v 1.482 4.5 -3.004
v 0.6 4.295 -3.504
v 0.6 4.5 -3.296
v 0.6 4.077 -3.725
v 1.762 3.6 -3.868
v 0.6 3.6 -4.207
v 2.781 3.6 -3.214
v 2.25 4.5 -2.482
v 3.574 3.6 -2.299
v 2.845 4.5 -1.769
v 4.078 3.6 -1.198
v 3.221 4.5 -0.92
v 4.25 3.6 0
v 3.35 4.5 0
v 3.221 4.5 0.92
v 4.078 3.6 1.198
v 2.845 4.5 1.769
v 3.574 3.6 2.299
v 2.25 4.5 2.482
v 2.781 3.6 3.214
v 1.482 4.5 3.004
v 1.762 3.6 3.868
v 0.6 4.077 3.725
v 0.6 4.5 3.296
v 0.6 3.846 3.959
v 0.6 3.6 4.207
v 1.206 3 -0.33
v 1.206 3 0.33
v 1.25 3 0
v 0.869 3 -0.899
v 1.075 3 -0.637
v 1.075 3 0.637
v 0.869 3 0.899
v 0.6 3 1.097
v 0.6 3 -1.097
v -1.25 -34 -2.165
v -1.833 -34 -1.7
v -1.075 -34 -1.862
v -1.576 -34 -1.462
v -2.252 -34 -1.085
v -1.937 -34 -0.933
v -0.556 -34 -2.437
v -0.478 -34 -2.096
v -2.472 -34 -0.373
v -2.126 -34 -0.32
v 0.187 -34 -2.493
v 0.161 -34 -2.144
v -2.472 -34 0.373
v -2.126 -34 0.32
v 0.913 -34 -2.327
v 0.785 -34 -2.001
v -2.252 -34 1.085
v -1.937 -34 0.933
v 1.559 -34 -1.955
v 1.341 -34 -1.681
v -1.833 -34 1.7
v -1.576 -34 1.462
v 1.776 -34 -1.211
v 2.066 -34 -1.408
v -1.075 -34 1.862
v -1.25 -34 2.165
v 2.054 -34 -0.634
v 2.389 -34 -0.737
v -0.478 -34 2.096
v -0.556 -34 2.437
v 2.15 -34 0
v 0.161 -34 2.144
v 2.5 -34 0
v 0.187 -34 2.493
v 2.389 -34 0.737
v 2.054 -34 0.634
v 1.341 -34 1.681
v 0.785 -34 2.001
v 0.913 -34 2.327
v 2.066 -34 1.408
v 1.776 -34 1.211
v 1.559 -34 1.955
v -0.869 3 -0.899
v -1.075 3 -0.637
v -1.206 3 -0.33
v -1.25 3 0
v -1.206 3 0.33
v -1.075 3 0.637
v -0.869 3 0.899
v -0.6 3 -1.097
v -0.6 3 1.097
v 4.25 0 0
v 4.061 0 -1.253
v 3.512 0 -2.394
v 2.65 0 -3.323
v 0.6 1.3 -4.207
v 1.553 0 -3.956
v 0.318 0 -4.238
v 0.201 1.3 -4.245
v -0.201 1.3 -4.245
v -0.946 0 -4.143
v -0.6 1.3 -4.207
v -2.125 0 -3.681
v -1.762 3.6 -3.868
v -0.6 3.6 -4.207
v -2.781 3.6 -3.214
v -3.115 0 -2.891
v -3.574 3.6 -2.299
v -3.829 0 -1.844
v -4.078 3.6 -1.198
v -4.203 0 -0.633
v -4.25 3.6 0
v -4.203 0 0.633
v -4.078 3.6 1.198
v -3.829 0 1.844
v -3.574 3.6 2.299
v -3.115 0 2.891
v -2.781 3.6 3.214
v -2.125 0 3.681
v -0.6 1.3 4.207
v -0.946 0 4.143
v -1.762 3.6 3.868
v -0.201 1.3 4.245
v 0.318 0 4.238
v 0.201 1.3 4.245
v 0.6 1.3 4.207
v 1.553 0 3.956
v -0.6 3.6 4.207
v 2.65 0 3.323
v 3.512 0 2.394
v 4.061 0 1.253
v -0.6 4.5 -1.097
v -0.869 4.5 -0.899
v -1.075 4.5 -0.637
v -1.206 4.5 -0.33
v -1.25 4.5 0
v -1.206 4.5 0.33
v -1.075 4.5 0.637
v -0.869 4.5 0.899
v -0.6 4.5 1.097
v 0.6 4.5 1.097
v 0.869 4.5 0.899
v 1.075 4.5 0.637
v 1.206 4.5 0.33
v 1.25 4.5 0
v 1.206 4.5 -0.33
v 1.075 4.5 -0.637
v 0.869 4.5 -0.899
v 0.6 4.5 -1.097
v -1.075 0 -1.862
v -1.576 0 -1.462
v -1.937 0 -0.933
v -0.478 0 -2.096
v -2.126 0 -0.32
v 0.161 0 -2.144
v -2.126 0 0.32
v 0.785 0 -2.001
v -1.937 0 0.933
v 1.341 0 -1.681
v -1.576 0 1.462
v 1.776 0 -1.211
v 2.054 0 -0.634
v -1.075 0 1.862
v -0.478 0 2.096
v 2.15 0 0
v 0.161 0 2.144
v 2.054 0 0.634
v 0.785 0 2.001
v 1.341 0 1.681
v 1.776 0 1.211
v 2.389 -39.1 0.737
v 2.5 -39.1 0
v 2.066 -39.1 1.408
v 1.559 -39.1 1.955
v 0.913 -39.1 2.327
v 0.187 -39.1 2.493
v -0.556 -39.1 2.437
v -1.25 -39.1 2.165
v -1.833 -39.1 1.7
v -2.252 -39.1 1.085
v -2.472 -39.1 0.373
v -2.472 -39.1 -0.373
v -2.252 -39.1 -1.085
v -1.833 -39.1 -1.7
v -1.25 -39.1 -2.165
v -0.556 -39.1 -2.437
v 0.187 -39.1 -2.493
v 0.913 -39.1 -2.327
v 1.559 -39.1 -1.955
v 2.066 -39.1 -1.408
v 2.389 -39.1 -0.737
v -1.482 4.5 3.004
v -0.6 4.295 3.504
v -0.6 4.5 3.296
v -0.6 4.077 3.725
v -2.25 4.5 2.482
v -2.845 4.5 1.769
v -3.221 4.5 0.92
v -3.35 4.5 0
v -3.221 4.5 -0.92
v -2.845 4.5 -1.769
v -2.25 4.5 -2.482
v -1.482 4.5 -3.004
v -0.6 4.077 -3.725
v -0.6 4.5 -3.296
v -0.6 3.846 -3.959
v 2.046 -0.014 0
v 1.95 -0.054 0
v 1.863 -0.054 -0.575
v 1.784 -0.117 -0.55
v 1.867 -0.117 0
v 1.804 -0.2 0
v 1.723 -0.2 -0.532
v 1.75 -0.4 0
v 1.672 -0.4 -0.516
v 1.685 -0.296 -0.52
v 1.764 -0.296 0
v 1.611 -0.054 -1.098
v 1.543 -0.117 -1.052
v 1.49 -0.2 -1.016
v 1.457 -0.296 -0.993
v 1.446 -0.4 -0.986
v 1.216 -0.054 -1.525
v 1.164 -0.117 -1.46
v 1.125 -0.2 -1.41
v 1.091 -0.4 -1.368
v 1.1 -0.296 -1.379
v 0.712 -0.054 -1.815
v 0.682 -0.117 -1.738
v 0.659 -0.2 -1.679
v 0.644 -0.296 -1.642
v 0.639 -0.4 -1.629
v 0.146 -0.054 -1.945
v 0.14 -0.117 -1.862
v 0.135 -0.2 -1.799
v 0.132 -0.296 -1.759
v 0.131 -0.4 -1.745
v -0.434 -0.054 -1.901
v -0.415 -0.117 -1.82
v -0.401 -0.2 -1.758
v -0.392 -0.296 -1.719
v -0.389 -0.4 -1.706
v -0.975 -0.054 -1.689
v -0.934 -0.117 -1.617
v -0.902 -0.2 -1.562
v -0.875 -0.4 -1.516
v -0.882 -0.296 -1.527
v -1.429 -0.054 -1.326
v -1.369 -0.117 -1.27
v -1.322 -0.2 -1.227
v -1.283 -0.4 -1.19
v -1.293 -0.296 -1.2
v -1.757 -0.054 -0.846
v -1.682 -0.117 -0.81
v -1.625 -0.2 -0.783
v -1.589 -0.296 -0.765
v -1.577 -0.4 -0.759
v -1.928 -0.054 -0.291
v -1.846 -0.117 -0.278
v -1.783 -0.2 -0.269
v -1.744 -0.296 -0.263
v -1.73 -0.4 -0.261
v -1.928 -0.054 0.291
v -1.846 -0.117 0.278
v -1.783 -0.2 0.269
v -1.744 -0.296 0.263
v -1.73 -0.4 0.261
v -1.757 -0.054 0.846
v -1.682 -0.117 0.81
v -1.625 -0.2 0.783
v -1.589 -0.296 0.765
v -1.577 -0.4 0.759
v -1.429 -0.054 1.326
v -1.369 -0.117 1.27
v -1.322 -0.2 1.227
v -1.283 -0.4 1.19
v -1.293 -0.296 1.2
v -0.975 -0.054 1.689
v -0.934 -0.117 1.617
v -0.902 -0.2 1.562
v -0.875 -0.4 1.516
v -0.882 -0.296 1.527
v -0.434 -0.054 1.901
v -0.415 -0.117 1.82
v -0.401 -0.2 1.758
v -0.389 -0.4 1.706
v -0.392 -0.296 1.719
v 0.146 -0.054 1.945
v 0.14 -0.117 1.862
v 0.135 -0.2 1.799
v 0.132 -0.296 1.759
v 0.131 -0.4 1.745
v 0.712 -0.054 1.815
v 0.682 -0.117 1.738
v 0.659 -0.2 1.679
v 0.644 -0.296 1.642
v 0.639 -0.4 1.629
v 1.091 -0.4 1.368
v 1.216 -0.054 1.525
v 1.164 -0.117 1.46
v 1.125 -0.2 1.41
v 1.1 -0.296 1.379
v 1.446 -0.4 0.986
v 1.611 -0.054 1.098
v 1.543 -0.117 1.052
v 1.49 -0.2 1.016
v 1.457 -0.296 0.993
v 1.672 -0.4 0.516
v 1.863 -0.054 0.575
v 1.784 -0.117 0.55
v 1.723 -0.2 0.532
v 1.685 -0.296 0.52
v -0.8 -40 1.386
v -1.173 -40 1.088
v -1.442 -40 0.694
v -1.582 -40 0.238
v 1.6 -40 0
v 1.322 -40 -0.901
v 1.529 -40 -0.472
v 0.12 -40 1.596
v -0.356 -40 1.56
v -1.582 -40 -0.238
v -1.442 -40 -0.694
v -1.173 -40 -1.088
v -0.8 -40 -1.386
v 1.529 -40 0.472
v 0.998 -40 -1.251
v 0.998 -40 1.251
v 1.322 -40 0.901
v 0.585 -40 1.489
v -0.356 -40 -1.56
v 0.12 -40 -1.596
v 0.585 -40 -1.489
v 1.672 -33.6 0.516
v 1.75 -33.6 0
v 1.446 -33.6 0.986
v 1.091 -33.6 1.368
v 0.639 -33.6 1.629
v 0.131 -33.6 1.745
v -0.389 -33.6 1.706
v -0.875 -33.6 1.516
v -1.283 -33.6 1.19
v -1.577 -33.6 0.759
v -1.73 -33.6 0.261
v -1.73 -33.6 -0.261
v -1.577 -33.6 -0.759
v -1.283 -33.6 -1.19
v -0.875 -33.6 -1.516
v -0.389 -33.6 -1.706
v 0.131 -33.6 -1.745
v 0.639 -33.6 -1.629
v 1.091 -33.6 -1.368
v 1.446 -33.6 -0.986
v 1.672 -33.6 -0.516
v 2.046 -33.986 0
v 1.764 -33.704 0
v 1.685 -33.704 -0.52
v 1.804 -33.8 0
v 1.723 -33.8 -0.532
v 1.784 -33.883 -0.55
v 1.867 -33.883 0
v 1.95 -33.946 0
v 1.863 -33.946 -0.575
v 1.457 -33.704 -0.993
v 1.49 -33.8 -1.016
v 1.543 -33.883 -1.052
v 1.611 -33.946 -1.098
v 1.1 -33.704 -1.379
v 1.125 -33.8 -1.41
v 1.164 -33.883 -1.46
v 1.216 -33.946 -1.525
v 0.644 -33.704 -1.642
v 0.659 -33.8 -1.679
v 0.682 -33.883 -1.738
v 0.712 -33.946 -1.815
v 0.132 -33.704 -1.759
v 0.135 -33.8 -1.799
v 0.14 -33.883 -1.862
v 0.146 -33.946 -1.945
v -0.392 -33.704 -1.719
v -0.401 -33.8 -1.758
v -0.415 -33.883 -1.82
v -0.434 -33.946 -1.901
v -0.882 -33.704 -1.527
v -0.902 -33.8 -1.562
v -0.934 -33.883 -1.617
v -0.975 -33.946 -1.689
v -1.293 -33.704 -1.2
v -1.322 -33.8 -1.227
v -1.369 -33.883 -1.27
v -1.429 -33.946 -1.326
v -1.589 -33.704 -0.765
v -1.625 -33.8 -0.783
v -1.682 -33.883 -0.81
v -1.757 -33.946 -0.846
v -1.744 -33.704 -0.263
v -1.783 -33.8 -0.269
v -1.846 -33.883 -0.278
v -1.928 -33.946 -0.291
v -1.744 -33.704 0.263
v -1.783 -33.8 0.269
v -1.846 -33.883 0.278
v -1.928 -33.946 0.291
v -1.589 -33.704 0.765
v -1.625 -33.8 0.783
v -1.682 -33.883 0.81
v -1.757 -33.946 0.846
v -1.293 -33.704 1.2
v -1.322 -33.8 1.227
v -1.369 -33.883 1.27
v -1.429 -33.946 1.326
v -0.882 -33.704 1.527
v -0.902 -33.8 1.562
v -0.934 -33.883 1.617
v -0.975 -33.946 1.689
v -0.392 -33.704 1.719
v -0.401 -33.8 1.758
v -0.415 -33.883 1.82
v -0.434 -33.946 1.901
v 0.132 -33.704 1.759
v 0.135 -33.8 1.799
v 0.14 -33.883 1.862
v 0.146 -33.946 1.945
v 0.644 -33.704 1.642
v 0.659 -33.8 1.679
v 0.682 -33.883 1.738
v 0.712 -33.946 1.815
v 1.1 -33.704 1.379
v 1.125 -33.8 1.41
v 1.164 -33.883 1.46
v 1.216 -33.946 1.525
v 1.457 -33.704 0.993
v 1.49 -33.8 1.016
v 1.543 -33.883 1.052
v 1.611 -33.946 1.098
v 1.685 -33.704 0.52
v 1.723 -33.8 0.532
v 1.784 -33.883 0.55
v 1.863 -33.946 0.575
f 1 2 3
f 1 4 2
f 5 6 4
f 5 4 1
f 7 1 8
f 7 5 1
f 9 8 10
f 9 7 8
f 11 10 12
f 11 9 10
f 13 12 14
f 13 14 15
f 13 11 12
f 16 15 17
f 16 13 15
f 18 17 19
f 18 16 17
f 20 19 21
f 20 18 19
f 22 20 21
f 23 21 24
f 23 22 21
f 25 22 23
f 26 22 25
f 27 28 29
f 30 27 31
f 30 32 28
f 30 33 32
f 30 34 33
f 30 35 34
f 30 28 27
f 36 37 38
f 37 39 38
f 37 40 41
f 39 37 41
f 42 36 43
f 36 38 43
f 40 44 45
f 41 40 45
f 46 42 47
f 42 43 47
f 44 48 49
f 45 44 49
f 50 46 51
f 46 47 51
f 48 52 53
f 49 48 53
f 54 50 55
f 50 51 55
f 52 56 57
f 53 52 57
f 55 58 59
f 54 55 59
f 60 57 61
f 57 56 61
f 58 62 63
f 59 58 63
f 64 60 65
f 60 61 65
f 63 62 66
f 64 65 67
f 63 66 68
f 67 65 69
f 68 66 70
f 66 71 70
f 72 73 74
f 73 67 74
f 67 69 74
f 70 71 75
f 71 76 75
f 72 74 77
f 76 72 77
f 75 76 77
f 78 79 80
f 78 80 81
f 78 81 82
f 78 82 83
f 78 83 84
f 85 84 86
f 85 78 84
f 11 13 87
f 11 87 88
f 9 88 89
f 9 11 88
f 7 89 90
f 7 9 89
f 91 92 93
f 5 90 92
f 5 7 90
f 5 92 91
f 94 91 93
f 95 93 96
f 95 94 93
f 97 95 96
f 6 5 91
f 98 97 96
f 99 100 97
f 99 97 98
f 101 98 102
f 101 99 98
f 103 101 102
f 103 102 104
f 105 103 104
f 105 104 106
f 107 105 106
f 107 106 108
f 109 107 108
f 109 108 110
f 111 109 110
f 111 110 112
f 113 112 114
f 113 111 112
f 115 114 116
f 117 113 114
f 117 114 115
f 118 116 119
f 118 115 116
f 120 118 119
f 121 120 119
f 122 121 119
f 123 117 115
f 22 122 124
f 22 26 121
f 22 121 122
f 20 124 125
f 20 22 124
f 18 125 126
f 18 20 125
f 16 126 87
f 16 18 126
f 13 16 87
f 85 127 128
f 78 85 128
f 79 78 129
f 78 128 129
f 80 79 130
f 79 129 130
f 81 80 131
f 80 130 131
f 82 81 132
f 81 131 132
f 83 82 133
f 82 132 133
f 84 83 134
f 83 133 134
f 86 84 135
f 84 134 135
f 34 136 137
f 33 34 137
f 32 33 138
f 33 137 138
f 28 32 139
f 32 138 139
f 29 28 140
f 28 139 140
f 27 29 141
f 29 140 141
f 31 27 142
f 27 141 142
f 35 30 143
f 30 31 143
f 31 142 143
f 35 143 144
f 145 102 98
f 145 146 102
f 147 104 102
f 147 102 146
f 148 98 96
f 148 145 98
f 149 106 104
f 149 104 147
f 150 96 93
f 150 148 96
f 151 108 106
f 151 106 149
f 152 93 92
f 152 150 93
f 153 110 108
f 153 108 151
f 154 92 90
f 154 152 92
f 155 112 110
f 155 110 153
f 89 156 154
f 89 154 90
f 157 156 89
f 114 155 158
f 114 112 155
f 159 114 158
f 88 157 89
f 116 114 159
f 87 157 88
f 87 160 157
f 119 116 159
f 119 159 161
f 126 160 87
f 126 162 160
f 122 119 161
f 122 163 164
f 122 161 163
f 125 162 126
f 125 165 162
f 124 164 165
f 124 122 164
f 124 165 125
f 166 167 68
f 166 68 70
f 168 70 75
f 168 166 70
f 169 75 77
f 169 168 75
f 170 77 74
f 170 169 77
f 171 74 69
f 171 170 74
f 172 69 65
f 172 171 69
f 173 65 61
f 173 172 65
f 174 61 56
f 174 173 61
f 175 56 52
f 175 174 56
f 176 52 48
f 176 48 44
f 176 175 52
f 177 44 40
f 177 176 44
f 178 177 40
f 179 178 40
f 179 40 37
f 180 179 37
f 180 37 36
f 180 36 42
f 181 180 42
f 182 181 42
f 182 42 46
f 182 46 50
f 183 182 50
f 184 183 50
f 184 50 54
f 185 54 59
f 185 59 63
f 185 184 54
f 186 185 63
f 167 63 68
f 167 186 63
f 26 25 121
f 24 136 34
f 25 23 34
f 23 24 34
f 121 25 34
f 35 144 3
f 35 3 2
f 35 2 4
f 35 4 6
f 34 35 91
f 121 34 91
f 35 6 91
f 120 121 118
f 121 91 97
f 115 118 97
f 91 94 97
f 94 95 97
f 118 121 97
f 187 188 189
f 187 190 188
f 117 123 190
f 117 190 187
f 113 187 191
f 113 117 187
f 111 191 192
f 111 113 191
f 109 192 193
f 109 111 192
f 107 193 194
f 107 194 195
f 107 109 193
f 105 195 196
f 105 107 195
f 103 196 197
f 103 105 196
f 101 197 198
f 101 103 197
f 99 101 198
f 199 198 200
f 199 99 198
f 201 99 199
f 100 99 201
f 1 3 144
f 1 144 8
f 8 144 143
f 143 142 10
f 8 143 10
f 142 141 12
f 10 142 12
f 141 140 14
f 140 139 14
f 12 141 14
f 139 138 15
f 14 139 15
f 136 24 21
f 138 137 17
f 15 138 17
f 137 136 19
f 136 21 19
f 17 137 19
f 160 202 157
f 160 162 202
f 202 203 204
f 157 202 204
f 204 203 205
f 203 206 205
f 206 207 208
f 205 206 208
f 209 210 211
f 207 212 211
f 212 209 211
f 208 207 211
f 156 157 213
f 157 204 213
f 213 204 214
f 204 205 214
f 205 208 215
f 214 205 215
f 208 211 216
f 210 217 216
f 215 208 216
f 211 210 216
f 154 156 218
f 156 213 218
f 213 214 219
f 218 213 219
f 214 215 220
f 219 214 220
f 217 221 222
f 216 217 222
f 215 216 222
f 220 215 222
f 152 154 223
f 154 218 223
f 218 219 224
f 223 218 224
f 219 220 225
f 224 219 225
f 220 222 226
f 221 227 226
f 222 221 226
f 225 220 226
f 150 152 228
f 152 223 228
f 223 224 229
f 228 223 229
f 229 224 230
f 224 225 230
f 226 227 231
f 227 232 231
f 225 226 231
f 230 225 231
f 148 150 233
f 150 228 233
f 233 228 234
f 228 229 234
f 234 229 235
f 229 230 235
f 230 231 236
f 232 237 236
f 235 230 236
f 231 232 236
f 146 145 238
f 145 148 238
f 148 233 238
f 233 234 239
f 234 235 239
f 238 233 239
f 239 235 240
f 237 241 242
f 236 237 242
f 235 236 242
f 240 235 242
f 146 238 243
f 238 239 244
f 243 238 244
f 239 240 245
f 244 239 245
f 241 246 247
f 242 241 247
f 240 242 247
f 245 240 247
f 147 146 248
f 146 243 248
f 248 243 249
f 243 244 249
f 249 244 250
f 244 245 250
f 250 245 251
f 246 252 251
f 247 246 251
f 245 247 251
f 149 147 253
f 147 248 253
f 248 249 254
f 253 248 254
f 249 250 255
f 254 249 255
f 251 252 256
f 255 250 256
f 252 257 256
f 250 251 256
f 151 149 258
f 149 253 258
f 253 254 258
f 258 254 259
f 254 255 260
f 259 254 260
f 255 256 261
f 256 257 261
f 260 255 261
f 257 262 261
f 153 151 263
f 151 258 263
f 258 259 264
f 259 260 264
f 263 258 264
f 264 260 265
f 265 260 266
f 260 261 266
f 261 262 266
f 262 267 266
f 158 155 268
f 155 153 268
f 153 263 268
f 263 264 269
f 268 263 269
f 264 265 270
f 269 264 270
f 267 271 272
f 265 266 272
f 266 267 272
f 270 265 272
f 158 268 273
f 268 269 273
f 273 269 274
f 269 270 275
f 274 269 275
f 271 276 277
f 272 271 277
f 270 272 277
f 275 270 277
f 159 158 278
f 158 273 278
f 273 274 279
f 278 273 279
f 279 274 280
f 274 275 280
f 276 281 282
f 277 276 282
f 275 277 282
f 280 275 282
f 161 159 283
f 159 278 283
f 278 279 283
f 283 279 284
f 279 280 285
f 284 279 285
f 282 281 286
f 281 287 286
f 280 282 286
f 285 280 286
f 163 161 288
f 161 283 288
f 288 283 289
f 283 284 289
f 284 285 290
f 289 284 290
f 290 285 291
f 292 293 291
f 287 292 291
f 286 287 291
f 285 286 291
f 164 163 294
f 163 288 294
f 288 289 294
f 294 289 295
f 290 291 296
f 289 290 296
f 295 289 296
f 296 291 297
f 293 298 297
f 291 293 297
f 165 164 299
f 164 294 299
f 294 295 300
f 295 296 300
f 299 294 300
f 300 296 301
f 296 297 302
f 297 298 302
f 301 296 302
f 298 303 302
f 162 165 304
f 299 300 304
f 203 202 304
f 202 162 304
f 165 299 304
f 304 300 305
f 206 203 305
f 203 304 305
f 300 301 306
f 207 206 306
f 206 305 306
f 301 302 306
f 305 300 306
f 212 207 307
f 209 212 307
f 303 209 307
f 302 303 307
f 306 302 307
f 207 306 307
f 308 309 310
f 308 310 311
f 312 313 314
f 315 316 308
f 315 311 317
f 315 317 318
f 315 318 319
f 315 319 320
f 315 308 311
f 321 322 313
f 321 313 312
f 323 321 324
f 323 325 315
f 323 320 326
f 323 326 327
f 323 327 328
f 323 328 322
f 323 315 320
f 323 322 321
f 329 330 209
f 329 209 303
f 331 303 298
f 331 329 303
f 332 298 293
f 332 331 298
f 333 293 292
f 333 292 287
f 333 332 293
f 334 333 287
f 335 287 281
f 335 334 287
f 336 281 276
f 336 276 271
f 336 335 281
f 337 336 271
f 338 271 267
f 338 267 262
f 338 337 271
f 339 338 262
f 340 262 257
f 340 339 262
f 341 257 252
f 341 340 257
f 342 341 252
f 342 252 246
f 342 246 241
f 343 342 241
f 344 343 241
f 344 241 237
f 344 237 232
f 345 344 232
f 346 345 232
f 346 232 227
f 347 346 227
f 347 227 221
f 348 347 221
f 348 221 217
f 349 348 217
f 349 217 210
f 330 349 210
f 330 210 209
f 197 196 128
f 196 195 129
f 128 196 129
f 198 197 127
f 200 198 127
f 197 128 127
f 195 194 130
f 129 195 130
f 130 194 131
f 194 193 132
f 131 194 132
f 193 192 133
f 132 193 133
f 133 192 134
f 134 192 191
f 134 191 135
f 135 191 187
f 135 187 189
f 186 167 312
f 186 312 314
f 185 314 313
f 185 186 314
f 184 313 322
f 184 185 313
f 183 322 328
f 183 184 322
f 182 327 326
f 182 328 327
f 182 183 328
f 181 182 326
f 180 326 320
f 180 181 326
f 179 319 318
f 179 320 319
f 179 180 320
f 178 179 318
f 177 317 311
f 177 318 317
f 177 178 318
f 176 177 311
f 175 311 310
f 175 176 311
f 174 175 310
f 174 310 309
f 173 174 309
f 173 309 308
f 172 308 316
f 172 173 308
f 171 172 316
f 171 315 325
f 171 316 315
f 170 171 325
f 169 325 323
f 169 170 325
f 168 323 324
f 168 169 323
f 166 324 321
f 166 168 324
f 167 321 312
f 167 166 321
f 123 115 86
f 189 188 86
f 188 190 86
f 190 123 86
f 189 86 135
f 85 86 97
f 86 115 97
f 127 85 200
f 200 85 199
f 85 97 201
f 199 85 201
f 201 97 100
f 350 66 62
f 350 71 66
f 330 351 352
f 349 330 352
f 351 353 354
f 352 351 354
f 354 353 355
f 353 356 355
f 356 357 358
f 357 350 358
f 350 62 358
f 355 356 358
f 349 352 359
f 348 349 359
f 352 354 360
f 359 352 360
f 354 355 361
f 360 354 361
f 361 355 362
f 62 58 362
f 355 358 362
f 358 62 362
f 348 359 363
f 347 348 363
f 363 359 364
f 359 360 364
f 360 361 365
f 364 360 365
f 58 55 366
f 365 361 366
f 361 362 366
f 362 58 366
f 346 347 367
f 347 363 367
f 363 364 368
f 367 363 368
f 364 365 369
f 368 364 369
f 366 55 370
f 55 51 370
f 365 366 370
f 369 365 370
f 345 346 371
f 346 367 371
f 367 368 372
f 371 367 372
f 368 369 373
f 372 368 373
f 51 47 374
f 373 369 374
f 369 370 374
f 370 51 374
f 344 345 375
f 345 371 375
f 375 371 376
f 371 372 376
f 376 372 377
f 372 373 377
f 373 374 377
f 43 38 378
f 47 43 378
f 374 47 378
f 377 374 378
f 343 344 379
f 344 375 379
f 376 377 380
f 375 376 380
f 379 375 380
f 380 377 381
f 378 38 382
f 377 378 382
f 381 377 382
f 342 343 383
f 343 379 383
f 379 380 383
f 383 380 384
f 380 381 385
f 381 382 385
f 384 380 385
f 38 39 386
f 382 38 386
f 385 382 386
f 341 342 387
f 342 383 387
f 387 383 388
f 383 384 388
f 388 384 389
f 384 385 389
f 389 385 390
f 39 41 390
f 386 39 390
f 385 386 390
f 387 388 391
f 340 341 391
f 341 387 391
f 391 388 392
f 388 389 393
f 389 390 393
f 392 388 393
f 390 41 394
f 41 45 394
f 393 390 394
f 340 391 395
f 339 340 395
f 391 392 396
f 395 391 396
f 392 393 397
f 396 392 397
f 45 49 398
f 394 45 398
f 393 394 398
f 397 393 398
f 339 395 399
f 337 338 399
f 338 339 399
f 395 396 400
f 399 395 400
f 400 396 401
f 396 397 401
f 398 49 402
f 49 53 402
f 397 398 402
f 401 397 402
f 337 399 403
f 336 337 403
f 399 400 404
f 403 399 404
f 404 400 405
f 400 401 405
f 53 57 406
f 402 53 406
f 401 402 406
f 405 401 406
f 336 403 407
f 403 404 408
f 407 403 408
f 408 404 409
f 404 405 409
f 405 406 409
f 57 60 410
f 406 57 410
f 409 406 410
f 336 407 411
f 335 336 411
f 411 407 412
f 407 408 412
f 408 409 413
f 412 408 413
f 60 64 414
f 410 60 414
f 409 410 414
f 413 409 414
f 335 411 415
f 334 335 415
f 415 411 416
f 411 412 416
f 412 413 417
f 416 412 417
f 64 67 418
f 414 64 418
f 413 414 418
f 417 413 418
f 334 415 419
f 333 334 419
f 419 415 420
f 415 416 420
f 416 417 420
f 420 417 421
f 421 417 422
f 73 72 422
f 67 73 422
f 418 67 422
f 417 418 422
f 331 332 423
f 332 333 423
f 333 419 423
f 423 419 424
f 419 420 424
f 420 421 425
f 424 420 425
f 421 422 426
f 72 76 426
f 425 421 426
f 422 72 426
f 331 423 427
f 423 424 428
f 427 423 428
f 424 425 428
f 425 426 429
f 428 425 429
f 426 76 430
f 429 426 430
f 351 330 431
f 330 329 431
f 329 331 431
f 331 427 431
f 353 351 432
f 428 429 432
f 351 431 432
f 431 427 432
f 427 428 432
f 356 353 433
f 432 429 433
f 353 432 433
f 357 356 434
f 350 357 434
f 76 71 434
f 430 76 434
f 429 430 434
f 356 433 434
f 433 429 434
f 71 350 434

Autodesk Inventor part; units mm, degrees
ref_plane "YZ Plane" through (0, 0, 0) normal (1, 0, 0) x (0, 1, 0)
ref_plane "XZ Plane" through (0, 0, 0) normal (0, 1, 0) x (-1, 0, 0)
ref_plane "XY Plane" through (0, 0, 0) normal (0, 0, 1) x (1, 0, 0)
sketch "Sketch1" plane through (0, 0, 0) normal (0, 0, 1) x (1, 0, 0)
  line L0 (4.25, 0) -> (4.25, 4.5)
  line L1 (4.25, 4.5) -> (0, 4.5)
  line L2 (4.25, 0) -> (1.75, 0)
  line L3 (1.75, 0) -> (1.75, -34)
  line L4 (1.75, -34) -> (2.5, -34)
  line L5 (2.5, -34) -> (2.5, -40)
  line L6 (2.5, -40) -> (0, -40)
  line L7 (0, 4.5) -> (0, -40)
  point P0 (0, 0)
  dimension "d0" = 8.5
  dimension "d2" = 3.5
  dimension "d3" = 5
  dimension "d4" = 4.5
  dimension "d5" = 6
  dimension "d6" = 40
revolve "Вращение1" add sketch "Sketch1" angle 360 about axis through (0, 4.5, 0) along (0, -1, 0)
sketch "Sketch2" plane through (0, 4.5, 0) normal (0, 1, 0) x (1, 0, 0)
  circle A0 centre (0, 0) radius 4.25 construction
  circle A1 centre (0, 0) radius 1.25
  dimension "d31" = 2.5
extrude "Выдавливание1" cut sketch "Sketch2" against normal blind 1.5
chamfer "Фаска1" distance 0.9 angle 45 1 edges at (-4.25, 4.5, 0)
sketch "Sketch3" plane through (0, 0, 0) normal (0, 0, 1) x (1, 0, 0)
  line L0 (0, 0) -> (0, 4.5)
  line L1 (-2.3552, 0) -> (2.3552, 0) construction
  line L2 (-4.25, 4.5) -> (4.25, 4.5) construction
  line L3 (-0.6, 4.5) -> (0.6, 4.5)
  line L4 (0.6, 4.5) -> (0.6, 1.3)
  line L5 (0.6, 1.3) -> (-0.6, 1.3)
  line L6 (-0.6, 1.3) -> (-0.6, 4.5)
  dimension "d8" = 1.3
  dimension "d9" = 1.2
extrude "Выдавливание2" cut sketch "Sketch3" along normal through all both and the other way through all
fillet "Сопряжение1" radius 0.4 2 edges at (-1.75, 0, 0) (-1.75, -34, 0)
thread "Резьба1" size "M5x0.8" class "6g" standard "ISO Metric profile" length 6
chamfer "Фаска2" distance 0.9 angle 45 1 edges at (-2.5, -40, 0)
equation "\"d31\" = d3_"
equation "\"d32\" = h3"
equation "\"d21\" = C1"
equation "\"d8\" = h2"
equation "\"d9\" = n"
equation "\"d12\" = R"
equation "\"d13\" = b"
equation "\"d15\" = C1"
equation "\"d0\" = D"
equation "\"d2\" = d1"
equation "\"d3\" = d_"
equation "\"d4\" = k1"
equation "\"d5\" = b"
equation "\"d6\" = l_"
equation "\"D\" = 8.5"
equation "\"d_\" = 5"
equation "\"l_\" = 40"
equation "\"b\" = 6"
equation "\"d1\" = 3.5"
equation "\"R\" = 0.4"
equation "\"C1\" = 0.9"
equation "\"h2\" = 1.3"
equation "\"n\" = 1.2"
equation "\"h3\" = 1.5"
equation "\"k1\" = 4.5"
equation "\"d3_\" = 2.5"
equation "\"G\" = l_ - b"
properties part number "Винт 3 M5-6gx40 ГОСТ 10336-80" material "Сталь, мягкая"
